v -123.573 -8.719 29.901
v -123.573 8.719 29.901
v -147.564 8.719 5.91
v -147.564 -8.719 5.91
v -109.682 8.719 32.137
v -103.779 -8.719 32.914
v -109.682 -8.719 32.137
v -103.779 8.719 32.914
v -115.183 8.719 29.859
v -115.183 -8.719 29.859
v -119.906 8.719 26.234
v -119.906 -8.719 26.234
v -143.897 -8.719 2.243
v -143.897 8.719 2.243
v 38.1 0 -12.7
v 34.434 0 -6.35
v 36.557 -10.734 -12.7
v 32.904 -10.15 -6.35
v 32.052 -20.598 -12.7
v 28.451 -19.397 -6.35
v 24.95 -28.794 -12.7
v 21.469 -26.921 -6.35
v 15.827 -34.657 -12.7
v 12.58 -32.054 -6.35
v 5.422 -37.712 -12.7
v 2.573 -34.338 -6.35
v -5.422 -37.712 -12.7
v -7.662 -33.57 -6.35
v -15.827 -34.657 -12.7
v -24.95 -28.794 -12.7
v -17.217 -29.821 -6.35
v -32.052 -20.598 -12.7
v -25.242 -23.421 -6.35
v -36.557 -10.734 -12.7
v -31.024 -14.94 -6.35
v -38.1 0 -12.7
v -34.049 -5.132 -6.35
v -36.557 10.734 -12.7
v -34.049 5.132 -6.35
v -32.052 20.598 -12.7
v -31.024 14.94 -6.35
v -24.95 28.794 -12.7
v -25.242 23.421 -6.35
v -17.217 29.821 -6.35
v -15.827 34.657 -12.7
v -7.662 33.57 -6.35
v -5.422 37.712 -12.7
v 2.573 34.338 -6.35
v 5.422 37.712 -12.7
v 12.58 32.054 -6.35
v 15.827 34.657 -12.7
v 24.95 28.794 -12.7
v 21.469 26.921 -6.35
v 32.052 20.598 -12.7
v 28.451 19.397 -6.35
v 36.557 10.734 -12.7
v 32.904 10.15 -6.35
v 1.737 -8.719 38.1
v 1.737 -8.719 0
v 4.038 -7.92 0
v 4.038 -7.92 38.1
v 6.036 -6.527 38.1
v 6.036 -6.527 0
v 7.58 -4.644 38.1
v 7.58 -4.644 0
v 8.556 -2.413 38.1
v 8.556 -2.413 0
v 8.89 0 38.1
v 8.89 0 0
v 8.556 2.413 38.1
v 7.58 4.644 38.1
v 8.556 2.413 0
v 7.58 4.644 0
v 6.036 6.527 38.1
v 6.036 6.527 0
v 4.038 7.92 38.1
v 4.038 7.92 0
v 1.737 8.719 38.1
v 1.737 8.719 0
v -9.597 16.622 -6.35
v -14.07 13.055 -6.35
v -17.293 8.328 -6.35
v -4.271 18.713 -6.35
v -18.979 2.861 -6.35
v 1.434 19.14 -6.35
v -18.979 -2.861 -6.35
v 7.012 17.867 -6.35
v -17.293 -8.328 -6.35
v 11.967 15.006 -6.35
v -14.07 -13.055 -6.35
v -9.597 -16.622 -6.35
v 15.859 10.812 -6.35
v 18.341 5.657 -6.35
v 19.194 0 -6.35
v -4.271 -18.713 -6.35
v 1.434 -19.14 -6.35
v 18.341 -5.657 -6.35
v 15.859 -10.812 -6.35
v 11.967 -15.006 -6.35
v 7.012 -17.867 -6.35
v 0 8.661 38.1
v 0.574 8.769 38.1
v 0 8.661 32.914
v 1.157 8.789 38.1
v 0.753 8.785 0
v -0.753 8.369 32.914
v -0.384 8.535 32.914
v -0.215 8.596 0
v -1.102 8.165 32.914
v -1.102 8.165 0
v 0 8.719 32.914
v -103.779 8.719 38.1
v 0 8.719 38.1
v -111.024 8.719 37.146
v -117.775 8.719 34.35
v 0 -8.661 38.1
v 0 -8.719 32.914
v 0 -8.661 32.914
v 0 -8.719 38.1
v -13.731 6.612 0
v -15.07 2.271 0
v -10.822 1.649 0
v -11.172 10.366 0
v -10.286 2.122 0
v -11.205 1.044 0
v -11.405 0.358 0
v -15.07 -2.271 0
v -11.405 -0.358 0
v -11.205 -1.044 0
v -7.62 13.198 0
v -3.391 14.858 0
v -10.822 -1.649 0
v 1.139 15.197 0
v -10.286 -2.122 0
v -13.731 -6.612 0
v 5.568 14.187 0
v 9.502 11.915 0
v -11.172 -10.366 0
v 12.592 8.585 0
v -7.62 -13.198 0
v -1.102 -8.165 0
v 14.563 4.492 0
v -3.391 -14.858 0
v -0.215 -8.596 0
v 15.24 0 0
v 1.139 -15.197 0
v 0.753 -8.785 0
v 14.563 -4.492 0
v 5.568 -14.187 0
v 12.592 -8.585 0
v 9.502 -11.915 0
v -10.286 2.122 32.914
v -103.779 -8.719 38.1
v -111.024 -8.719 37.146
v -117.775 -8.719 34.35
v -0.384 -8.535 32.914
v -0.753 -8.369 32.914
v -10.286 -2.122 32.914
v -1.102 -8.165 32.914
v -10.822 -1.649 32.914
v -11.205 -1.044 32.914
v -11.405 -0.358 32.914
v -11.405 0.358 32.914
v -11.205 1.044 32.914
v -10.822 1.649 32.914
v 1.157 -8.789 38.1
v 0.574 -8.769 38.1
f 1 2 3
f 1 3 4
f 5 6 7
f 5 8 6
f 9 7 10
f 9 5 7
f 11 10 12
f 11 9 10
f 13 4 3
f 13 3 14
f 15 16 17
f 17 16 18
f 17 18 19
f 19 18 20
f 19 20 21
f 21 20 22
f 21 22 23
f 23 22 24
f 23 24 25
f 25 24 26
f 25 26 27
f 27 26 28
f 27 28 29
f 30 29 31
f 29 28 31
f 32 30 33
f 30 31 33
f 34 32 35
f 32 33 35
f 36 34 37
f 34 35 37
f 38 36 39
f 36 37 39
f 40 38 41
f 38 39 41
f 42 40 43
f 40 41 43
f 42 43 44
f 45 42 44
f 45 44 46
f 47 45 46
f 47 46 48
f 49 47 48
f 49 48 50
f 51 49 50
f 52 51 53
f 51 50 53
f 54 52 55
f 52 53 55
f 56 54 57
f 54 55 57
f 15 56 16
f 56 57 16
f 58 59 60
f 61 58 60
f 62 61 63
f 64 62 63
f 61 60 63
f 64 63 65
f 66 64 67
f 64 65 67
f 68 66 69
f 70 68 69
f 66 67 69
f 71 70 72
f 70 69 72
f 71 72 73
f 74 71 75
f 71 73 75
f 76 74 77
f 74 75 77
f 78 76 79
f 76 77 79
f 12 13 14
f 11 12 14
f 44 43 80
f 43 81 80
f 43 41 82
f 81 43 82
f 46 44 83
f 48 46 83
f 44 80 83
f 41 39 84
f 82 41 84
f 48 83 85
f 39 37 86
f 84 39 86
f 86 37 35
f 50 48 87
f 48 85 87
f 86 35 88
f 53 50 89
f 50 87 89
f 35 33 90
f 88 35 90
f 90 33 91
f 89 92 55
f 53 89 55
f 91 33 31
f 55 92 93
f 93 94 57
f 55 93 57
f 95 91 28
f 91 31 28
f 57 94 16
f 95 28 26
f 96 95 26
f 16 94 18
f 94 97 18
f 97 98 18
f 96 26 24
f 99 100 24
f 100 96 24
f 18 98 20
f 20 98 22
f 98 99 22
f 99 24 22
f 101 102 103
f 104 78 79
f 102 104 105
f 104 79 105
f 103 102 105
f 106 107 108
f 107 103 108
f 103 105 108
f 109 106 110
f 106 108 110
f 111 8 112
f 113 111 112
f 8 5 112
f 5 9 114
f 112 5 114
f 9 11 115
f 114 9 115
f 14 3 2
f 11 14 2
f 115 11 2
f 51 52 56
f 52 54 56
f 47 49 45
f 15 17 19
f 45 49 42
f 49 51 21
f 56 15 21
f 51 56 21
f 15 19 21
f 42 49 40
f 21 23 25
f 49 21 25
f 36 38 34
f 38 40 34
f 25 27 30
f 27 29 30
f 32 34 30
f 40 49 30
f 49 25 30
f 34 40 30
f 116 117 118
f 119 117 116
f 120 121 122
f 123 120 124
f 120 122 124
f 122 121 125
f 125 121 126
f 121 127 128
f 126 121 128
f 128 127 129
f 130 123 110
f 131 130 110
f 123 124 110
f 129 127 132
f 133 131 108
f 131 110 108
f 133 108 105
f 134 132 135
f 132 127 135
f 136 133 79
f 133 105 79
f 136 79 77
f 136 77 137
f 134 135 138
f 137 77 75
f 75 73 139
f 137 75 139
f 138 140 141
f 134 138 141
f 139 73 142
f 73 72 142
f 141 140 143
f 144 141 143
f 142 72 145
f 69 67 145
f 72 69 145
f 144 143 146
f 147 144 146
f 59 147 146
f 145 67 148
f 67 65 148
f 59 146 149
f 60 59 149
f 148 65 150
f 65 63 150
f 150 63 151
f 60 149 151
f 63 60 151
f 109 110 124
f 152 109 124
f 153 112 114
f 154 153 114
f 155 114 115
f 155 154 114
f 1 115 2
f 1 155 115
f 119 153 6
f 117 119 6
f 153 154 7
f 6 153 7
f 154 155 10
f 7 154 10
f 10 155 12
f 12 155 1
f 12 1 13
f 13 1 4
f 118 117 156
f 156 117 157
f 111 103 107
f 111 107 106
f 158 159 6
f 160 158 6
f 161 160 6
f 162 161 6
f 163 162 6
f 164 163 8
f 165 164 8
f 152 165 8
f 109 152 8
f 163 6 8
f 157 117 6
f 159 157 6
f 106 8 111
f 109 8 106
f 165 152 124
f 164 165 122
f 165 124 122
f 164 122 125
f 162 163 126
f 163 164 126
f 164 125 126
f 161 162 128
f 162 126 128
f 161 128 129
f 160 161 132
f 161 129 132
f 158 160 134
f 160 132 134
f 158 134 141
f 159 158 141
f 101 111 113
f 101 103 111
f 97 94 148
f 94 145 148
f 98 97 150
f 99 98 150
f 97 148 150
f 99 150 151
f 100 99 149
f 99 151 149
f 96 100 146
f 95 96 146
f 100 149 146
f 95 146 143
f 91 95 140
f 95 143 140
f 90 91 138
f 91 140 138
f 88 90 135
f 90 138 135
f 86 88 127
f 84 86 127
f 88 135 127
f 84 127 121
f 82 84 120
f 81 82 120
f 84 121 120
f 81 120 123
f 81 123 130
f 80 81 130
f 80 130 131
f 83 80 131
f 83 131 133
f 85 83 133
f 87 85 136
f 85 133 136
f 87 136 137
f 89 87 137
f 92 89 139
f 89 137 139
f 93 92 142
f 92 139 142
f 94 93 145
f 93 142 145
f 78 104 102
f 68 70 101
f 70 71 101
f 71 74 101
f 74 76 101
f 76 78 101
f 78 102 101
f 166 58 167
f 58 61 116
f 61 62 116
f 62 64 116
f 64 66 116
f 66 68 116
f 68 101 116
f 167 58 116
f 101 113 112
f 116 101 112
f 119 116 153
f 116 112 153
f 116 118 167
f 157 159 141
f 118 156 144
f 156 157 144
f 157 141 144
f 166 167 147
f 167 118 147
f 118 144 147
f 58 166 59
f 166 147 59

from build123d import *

# Parameters (mm, degrees)
BOSS_EXTRUDE1_DEPTH = 38.1
SKETCH3_W           = 5.185673946
SKETCH3_H           = 17.43749126


with BuildPart() as part:
    # Sketch1 → Revolve1 (revolve)
    with BuildSketch(Plane(origin=(0, 0, 0), x_dir=(1, 0, 0), z_dir=(0, 1, 0))):
        Polygon((0, 0), (0, 12.7), (38.1, 12.7), (34.433825791, 6.35), (19.193825791, 6.35), (15.24, 0), align=None)
    revolve(axis=Axis((0, 0, 0), (0, 0, -1)))

    # Sketch2 → Boss-Extrude1 (add)
    with BuildSketch(Plane.XY):
        with BuildLine():
            Line((-1.101928038, 8.164948968), (-10.28615812, 2.121872405))
            ThreePointArc((-10.28615812, 2.121872405), (-11.43, 0), (-10.28615812, -2.121872405))
            Line((-10.28615812, -2.121872405), (-1.101928038, -8.164948968))
            ThreePointArc((-1.101928038, -8.164948968), (0.26271934, -8.721632133), (1.736540998, -8.71874563))
            ThreePointArc((1.736540998, -8.71874563), (8.89, 0), (1.736540998, 8.71874563))
            ThreePointArc((1.736540998, 8.71874563), (0.26271934, 8.721632133), (-1.101928038, 8.164948968))
        make_face()
    extrude(amount=BOSS_EXTRUDE1_DEPTH)

    # Sweep1: sweep along a path in Sketch4
    with BuildLine(Plane(origin=(0, 0, 0), x_dir=(1, 0, 0), z_dir=(0, 1, 0))) as sweep1_path:
        Line((0, -35.507163027), (-103.778975516, -35.507163027))
        ThreePointArc((-103.778975516, -35.507163027), (-113.499134698, -33.573703153), (-121.739487758, -28.067675269))
        Line((-121.739487758, -28.067675269), (-145.730896424, -4.076266603))
    # Sketch3 → Sweep1 (sweep)
    with BuildSketch(Plane(origin=(0, 0, 0), x_dir=(0, 0, -1), z_dir=(1, 0, 0))):
        with Locations((-35.507163027, 0)):
            Rectangle(SKETCH3_W, SKETCH3_H)
    sweep(path=sweep1_path.line)


solid = part.part
